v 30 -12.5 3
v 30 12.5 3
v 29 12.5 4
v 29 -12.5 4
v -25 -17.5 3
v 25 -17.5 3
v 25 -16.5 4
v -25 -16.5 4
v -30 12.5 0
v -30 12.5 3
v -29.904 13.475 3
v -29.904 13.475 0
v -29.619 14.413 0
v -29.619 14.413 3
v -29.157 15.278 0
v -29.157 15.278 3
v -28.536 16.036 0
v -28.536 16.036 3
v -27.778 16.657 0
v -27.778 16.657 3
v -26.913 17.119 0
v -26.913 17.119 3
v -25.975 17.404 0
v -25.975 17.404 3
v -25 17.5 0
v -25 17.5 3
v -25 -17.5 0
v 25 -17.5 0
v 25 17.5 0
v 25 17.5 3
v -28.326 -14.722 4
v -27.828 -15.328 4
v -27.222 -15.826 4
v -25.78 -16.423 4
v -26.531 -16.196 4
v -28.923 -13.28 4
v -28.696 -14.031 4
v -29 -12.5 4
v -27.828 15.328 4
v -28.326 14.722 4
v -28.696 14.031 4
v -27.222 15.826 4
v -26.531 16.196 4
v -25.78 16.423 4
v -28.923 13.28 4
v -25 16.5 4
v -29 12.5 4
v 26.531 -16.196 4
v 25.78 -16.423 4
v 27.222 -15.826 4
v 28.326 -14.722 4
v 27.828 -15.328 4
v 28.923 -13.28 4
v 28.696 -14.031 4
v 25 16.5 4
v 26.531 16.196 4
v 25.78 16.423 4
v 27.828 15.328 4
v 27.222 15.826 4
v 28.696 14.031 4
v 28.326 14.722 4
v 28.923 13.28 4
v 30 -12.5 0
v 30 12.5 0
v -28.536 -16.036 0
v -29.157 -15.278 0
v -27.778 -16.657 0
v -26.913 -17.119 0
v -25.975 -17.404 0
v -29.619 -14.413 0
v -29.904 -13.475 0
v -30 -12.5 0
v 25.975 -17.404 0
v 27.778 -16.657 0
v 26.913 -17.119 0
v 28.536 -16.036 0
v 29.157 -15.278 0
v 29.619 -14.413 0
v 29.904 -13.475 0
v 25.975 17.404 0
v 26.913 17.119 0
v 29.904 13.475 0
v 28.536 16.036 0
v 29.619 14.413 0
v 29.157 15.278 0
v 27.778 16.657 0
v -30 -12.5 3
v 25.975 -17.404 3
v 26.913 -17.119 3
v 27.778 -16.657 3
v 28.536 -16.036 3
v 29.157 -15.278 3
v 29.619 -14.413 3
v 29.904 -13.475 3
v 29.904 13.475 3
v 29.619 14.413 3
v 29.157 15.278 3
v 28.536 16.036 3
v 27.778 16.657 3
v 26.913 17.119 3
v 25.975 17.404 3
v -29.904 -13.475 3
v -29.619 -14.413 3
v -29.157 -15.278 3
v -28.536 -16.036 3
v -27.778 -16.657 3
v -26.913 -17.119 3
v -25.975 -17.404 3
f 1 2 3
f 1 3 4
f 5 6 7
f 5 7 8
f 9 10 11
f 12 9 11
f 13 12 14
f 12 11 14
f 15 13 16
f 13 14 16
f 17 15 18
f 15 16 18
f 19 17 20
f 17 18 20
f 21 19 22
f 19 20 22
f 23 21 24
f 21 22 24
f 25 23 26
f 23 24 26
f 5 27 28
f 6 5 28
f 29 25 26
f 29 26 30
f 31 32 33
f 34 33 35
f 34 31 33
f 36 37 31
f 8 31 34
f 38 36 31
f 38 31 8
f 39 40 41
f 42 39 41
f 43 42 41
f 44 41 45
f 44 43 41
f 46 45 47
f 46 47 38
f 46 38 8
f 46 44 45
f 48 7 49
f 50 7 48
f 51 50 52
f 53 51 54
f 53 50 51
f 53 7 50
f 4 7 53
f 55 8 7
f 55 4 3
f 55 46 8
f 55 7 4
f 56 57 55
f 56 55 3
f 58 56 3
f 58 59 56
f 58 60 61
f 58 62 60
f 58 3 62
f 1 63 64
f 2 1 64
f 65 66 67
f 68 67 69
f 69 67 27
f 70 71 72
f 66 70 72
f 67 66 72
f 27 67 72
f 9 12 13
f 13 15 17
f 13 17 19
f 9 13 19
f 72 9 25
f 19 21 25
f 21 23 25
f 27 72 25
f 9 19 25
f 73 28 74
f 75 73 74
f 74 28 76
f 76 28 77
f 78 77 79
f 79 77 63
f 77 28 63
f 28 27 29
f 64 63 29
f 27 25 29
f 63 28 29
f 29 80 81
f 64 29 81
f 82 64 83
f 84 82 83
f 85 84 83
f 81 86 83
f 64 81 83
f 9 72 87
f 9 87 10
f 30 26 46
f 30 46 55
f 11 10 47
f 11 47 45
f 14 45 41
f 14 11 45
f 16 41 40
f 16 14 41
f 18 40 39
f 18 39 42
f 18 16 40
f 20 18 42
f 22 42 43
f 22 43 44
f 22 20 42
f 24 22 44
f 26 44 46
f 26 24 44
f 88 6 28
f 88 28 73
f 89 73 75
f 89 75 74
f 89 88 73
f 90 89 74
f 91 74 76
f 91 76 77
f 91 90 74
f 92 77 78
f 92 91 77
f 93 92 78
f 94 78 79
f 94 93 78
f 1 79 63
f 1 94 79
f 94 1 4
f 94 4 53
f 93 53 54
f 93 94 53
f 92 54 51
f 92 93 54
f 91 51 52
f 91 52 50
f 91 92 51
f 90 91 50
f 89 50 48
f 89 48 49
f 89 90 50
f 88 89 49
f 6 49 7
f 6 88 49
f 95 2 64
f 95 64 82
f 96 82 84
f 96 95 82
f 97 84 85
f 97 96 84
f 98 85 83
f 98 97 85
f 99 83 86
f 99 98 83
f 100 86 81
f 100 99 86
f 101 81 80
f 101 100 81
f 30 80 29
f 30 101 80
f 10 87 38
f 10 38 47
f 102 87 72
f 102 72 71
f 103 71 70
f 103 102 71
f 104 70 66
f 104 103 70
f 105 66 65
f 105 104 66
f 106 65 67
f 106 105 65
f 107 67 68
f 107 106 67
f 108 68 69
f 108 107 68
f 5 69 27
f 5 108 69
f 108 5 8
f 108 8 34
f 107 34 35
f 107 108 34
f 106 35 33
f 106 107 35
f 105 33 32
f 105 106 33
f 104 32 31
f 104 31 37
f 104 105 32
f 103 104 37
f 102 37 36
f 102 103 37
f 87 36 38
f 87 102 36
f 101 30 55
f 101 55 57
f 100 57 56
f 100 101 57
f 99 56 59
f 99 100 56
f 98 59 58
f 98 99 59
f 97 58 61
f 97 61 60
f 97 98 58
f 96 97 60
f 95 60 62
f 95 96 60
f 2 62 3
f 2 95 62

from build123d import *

# Parameters (mm, degrees)
F0_W     = 60
F0_H     = 35
F1_DEPTH = 4
F2_R     = 5
F3_SIZE  = 1


with BuildPart() as f1:
    # F0 (on Top) → F1 (new body)
    with BuildSketch(Plane.XY):
        Rectangle(F0_W, F0_H)
    extrude(amount=F1_DEPTH)

    # F2
    f2_edges = [f1.edges().sort_by_distance(p)[0] for p in [
        (-30, 17.5, 2),
        (-30, -17.5, 2),
        (30, -17.5, 2),
        (30, 17.5, 2),
    ]]
    fillet(f2_edges, radius=F2_R)

    # F3
    f3_edges = [f1.edges().sort_by_distance(p)[0] for p in [
        (0, 17.5, 4),
        (-30, 0, 4),
        (0, -17.5, 4),
        (30, 0, 4),
    ]]
    chamfer(f3_edges, length=F3_SIZE)


solid = f1.part
